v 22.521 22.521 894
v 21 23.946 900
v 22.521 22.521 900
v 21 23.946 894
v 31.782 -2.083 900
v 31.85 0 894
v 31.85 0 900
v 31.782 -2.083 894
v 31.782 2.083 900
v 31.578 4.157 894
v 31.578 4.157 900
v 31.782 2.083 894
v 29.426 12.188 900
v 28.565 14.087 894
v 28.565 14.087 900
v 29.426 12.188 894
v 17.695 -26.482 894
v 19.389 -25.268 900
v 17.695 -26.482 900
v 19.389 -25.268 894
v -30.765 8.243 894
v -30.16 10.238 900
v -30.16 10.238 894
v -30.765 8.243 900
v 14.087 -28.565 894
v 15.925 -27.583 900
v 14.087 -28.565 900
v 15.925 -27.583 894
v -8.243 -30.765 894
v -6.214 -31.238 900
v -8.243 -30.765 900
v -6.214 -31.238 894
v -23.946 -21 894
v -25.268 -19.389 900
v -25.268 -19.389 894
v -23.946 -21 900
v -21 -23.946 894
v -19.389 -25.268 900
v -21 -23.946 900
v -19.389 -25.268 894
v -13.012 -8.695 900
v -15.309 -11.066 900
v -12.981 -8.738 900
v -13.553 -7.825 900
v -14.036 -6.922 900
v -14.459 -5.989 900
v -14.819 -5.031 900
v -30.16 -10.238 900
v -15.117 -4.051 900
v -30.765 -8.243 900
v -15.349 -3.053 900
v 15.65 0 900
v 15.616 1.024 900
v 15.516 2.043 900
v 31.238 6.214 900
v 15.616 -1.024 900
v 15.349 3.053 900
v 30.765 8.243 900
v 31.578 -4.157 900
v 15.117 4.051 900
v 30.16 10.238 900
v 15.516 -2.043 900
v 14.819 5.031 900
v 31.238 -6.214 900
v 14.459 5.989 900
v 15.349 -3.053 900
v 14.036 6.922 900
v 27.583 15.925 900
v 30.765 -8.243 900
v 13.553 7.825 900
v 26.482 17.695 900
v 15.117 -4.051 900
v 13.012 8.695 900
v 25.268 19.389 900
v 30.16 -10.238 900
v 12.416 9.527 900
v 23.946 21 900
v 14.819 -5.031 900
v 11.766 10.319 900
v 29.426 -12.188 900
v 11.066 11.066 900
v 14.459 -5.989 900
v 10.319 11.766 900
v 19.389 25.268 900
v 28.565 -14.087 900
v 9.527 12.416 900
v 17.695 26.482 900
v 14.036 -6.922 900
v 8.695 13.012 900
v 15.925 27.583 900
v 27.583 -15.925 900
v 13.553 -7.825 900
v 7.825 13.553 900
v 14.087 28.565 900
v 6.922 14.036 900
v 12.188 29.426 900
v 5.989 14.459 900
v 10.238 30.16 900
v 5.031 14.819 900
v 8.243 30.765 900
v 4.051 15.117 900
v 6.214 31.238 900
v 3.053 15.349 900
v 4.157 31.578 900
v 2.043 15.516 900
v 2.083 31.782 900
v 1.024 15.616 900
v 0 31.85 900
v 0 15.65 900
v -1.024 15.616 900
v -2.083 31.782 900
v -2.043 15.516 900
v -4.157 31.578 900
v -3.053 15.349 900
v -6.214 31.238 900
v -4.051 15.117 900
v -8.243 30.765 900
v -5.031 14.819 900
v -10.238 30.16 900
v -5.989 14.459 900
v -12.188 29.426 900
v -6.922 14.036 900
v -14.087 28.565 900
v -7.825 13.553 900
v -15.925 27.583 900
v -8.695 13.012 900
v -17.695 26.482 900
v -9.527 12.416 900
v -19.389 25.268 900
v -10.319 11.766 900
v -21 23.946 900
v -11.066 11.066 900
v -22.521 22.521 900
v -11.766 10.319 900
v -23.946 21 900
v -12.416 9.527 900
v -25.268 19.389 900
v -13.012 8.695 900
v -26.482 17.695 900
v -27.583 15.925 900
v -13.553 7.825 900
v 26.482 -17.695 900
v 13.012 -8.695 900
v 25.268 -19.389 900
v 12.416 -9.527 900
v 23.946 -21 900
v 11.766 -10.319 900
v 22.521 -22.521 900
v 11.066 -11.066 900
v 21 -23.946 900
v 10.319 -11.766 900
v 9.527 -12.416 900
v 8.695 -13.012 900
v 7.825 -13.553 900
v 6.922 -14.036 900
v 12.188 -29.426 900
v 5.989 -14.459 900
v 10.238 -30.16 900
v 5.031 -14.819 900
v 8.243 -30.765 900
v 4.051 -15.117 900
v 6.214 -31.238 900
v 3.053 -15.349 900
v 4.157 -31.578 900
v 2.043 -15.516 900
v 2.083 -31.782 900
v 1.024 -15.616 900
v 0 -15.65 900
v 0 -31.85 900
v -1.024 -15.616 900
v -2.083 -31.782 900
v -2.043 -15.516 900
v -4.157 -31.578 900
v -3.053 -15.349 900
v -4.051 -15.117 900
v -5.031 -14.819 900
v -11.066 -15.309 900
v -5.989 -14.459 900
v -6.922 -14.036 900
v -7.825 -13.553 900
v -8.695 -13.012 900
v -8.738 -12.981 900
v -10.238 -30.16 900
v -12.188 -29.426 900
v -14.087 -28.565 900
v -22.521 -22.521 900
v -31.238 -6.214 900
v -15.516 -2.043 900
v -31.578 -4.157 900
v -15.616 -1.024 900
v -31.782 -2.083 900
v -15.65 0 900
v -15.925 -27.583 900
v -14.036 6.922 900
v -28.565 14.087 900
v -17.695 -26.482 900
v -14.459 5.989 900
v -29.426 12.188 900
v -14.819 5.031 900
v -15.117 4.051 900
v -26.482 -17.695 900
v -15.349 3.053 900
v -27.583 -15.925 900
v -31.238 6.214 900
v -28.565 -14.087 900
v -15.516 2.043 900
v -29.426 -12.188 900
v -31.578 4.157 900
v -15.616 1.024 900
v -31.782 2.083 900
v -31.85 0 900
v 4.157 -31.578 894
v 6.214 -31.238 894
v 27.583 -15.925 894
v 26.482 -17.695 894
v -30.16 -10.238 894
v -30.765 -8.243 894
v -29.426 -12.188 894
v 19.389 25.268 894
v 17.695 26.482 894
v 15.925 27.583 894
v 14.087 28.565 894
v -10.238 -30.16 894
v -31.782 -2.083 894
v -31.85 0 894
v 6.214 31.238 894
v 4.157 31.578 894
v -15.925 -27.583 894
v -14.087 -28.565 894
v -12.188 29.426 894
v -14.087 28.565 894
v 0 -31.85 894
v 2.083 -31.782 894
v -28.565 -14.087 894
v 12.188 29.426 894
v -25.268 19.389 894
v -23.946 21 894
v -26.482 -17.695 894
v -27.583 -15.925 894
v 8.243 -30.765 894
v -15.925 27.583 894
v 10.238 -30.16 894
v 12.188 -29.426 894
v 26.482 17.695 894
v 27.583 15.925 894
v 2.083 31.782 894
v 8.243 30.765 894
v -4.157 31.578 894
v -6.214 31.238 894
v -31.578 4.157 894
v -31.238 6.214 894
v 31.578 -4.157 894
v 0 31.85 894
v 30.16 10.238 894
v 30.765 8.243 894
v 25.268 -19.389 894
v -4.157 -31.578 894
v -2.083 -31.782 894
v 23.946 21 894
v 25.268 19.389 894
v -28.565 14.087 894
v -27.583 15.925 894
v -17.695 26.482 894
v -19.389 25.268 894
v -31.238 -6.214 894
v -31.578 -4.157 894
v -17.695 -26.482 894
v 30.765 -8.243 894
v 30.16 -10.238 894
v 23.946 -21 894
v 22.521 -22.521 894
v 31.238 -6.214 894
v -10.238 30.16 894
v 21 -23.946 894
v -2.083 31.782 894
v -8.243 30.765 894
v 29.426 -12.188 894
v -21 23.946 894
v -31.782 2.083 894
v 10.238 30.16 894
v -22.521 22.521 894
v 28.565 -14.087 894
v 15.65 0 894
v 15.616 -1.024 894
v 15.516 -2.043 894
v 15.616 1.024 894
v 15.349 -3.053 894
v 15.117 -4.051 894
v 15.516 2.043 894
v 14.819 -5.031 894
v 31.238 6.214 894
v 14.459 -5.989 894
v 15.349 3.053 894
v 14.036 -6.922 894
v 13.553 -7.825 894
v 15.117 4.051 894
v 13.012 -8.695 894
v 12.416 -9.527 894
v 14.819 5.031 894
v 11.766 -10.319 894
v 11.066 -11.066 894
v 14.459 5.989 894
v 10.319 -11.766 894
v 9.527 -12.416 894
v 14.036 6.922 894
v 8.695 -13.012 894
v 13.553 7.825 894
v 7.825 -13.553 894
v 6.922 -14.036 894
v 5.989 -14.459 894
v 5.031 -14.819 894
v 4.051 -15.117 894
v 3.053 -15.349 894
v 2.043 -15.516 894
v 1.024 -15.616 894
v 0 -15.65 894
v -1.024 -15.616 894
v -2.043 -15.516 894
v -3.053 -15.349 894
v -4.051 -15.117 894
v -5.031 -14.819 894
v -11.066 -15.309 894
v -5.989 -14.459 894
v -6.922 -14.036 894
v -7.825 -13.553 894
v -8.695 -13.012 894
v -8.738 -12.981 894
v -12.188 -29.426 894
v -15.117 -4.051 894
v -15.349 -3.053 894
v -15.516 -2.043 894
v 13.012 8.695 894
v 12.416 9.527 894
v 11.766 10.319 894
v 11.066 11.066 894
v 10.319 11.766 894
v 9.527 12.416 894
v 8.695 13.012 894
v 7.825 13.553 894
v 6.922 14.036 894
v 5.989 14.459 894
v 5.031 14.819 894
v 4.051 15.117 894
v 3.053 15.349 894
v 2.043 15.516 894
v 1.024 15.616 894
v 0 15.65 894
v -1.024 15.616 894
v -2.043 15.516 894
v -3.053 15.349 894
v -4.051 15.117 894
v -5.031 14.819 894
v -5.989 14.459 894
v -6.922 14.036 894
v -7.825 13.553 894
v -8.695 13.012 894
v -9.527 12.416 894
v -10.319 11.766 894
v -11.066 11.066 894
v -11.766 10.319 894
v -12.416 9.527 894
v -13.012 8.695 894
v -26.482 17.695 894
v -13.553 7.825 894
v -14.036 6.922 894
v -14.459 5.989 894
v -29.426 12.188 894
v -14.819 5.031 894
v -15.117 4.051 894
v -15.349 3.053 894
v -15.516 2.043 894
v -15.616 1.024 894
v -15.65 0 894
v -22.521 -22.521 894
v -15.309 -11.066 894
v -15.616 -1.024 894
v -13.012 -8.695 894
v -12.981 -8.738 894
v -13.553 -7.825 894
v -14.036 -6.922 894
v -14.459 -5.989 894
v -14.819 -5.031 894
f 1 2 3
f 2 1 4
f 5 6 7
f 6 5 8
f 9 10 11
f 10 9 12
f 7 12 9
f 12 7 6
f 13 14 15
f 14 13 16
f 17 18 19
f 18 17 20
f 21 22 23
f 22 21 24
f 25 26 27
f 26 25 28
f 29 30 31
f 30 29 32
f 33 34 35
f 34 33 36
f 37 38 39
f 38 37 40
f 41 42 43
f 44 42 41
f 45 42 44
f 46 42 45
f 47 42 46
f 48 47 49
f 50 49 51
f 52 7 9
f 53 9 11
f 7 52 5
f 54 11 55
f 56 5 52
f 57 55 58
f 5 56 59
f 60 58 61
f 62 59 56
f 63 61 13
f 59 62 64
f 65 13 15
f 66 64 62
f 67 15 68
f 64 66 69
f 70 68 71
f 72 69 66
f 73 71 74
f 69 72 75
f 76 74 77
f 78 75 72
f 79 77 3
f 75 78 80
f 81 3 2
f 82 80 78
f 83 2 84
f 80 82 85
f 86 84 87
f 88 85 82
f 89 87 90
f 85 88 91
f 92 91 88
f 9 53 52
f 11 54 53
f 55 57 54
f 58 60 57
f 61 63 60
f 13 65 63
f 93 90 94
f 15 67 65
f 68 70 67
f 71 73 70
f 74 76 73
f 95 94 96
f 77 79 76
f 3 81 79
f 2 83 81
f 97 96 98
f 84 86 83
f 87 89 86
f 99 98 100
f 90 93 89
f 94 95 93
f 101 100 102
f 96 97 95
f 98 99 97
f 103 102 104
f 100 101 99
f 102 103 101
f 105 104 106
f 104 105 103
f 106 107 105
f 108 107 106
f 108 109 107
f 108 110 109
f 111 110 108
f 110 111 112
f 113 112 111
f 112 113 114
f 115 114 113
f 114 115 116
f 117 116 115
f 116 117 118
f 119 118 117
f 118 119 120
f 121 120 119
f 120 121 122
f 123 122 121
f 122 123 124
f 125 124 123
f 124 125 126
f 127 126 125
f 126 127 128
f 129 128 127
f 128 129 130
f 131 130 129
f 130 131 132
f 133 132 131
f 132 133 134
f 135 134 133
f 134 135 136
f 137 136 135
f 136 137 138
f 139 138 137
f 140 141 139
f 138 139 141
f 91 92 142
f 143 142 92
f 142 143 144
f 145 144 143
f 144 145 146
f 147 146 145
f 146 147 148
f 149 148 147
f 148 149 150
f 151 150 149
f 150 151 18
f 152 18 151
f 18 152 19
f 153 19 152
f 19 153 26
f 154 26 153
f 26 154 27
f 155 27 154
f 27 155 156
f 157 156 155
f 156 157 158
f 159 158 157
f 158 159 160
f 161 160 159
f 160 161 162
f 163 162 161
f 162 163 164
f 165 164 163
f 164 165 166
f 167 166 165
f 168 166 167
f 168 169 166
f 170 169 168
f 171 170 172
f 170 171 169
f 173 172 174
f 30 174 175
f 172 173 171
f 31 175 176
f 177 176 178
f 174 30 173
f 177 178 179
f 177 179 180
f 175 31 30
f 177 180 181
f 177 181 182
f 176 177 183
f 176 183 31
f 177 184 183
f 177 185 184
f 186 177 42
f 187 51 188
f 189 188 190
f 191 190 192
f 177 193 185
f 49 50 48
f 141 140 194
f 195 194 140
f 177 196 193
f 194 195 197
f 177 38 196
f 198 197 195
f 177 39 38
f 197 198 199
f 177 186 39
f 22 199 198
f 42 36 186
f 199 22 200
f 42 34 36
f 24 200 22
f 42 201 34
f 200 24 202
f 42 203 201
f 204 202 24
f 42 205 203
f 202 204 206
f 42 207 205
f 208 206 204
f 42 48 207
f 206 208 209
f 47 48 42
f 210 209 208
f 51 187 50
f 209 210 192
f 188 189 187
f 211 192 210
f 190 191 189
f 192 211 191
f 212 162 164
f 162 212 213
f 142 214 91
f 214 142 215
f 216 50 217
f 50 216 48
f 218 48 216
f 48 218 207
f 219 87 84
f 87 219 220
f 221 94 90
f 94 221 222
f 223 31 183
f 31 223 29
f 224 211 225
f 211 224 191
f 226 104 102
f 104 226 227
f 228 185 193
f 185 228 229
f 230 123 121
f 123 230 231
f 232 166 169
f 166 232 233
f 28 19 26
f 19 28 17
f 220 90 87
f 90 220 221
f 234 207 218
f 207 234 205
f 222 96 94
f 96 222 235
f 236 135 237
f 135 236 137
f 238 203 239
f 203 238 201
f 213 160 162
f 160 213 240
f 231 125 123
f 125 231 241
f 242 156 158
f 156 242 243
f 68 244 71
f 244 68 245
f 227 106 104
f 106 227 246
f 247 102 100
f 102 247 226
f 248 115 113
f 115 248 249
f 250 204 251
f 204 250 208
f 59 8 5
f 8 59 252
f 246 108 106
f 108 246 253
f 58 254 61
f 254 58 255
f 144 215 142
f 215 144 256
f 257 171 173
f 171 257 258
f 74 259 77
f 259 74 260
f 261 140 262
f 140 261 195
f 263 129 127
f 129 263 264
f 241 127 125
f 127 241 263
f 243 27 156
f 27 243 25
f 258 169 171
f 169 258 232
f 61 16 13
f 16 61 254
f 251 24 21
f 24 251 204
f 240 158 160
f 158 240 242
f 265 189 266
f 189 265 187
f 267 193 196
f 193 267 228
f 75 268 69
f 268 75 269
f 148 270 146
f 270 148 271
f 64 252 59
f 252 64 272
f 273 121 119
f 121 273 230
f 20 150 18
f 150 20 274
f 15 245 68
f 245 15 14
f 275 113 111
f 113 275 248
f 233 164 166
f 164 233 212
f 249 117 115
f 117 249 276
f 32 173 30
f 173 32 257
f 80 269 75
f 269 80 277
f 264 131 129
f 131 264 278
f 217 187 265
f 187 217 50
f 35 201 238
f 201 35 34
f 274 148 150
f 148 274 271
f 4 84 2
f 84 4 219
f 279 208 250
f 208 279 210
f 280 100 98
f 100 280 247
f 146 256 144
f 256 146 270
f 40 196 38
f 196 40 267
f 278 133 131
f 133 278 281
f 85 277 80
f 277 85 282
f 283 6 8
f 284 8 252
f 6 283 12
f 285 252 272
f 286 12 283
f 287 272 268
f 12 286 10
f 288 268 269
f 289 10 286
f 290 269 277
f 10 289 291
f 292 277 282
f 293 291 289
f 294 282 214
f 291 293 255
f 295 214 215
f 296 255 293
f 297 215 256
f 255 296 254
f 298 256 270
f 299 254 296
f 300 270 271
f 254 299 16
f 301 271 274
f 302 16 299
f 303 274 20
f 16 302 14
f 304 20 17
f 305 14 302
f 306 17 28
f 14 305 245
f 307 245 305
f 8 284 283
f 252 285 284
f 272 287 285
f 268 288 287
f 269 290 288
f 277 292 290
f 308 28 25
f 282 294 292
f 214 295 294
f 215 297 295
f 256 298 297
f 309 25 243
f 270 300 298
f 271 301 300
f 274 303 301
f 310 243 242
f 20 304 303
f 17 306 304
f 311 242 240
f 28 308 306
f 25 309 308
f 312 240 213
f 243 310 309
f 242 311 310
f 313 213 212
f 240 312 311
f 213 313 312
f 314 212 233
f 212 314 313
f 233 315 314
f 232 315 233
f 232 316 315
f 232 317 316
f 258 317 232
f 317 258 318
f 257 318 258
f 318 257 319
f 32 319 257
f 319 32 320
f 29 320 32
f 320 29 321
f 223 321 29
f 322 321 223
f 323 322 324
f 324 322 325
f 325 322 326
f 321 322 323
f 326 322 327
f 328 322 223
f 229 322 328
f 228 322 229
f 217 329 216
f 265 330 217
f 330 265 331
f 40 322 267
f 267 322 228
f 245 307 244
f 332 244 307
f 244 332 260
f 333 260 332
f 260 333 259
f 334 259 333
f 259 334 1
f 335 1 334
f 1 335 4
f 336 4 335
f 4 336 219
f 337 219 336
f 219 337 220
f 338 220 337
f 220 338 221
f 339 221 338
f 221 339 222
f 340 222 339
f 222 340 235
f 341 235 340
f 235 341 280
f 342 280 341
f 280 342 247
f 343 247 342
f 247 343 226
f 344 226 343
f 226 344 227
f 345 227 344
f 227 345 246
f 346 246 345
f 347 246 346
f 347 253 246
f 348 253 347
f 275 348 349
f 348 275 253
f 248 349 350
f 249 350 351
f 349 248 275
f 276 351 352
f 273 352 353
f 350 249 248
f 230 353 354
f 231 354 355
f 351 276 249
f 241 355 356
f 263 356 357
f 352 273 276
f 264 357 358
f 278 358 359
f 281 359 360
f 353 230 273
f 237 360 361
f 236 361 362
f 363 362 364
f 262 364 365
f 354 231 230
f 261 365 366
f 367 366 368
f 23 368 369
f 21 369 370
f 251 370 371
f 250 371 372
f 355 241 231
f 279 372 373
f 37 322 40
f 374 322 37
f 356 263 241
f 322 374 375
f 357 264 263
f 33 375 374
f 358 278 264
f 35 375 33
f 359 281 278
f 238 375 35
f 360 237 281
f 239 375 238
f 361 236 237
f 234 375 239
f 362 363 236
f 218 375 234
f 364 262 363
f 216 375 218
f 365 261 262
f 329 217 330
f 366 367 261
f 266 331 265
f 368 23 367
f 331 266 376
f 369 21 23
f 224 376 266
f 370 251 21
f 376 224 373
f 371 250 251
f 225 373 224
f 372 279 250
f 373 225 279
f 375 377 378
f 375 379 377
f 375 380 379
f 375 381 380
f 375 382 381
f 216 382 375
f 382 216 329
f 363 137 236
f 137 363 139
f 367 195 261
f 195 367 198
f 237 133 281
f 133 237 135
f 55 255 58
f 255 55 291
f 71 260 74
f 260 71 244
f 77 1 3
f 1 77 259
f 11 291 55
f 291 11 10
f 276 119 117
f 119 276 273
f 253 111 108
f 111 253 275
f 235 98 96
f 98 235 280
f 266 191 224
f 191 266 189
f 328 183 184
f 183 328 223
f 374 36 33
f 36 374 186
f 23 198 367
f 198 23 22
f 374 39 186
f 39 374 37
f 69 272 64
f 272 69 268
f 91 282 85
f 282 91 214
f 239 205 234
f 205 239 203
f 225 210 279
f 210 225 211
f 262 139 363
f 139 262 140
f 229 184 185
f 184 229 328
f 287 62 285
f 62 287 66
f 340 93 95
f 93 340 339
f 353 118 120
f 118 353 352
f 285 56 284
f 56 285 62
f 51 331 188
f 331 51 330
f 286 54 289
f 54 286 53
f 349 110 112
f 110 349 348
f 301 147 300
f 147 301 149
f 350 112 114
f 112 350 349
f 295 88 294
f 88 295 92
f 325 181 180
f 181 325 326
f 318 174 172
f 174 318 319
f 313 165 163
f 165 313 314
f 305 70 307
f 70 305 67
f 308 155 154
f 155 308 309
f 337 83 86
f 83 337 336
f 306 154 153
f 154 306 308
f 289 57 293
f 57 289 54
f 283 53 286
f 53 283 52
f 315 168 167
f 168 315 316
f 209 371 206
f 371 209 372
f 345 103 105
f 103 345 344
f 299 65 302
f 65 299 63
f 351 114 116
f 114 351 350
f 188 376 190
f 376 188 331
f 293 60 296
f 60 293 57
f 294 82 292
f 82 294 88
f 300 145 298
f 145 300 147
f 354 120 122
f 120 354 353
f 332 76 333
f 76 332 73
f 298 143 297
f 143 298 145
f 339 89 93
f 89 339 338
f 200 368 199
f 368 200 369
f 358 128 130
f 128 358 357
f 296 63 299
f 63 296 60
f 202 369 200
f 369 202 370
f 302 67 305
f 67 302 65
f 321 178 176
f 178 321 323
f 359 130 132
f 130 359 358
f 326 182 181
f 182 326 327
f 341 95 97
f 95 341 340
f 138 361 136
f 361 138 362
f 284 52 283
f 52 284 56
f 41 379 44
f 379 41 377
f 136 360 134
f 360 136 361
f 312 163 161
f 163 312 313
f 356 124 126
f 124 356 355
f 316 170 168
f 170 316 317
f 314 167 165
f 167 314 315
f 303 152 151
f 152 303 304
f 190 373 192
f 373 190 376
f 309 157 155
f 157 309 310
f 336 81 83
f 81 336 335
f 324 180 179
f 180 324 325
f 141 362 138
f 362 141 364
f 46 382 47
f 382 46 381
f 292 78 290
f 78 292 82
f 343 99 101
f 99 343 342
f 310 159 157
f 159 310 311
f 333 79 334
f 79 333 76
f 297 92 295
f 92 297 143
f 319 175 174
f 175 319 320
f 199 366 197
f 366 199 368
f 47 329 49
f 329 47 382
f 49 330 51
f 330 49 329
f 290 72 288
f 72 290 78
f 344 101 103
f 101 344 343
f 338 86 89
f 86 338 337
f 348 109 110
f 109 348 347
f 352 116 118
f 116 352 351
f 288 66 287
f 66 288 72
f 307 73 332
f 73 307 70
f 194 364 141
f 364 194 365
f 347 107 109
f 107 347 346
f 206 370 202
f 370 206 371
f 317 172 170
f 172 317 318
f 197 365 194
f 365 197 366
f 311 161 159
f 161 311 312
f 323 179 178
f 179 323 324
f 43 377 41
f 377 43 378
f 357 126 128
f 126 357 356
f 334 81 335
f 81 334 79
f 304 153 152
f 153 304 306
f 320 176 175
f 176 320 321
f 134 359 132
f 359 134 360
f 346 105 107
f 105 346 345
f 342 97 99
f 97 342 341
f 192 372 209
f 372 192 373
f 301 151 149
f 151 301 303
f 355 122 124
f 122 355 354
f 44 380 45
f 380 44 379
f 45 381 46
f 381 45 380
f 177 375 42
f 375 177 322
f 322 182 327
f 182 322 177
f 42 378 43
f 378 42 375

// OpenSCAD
// file: ../lib/astra66_core.scad
// =============================================================================
// ASTRA-66 CAD rev B -- core library
// Parameters (generated from analysis.py by build.py), derived stations and helpers.
// Every part file includes this; stations mirror analysis.py X[] exactly.
//
// Frame: rocket axis = +Z, STA 0 = nose tip, stations increase aft.
// Angles: measured about +Z from +X toward +Y.  90 deg = switch / hatch side,
// 270 deg = camera side, 45 deg = rail-button line, fins at 0/90/180/270 deg.
// =============================================================================
include <../astra66_params.scad>

$fn = FN;
EPS = 0.01;
CAD_REV = "B";

// ----------------------------------------------------------------- radii
R_OD    = BODY_OD / 2;                 // body tube outer
R_ID    = BODY_ID / 2;                 // body tube inner
R_SH    = (BODY_ID - FIT_SH) / 2;      // printed shoulder / ring OD radius
R_SI    = R_SH - NC_SH_WALL;           // nose shoulder inner radius
R_CO    = CPL_OD / 2;                  // coupler outer
R_CI    = CPL_ID / 2;                  // coupler inner
R_BH_IN = (CPL_ID - 0.2) / 2;          // inner bulkhead disc (fits in coupler)
R_MO    = MMT_OD / 2;
R_MI    = MMT_ID / 2;
R_RING_BORE = (MMT_OD + FIT_SH) / 2;   // centering-ring / core bore
R_TAB_FLOOR = max(R_MO, RET_CLEAR_D / 2);          // rev B: tab clears the COTS retainer
FIN_TAB_H   = R_OD - R_TAB_FLOOR - FIN_TAB_CLR;

// ----------------------------------------------------------------- stations
X_NC_BASE     = NC_L;
X_SH_END      = NC_L + NC_SH_L;
X_PL_END      = NC_L + PL_L;
X_BAND_END    = X_PL_END + AV_BAND_L;
X_END         = X_BAND_END + BO_L;
L_OVERALL     = X_END;                              // airframe length (excl. COTS retainer)
X_CPL_FWD     = X_PL_END - AV_INS;
X_CPL_AFT     = X_BAND_END + AV_INS;
X_AVB_FWD_OUT = X_CPL_FWD - AV_BH_T;                // AV-303 forward face
X_AVB_AFT_OUT = X_CPL_AFT + GASKET_T;               // AV-304 outer-disc forward face
X_AVB_AFT_END = X_AVB_AFT_OUT + AV_BH_T;            // AV-304 aft face (recovery bay starts)
X_SLED_FWD    = X_CPL_FWD + AV_BH_T + SLED_FWD_GAP;
X_SLED_AFT    = X_SLED_FWD + SLED_L;
X_MMT_AFT     = X_END + MMT_AFT_EXT;
X_MMT_FWD     = X_MMT_AFT - MMT_L;
X_FIN_LE      = X_END - FIN_CR;
X_TAB_FWD     = X_FIN_LE + FIN_TAB_FWD;
X_TAB_AFT     = X_END - LOCK_T;
X_CORE_FWD    = X_TAB_FWD - CORE_RING_T;
X_CORE_AFT    = X_END - LOCK_T;
X_NC_SCREW    = NC_L + NC_SH_L / 2;
X_CAM         = X_SH_END + CAM_OFF;
X_HATCH       = X_SH_END + HATCH_OFF;
X_RB_FWD      = X_MMT_FWD - RB_FWD_OFF;
X_RB_AFT      = X_END - RB_AFT_OFF;
X_TRAY_FWD    = X_AVB_FWD_OUT - TRAY_L;
X_SW          = X_PL_END + AV_BAND_L / 2;
X_MOTOR_FWD   = X_MMT_AFT - MOTOR_L;
X_BAT0        = X_SLED_FWD + 2;
BAT_CAGE_L    = 12 + BAT_L + 0.6;
PAYLOAD_BAY_L  = X_AVB_FWD_OUT - X_SH_END;
RECOVERY_BAY_L = X_MMT_FWD - X_AVB_AFT_END;

FIN_ANGLES      = [for (i = [0 : FIN_N - 1]) i * 360 / FIN_N];
LOCK_SCREW_ANG  = [45, 135, 225, 315];
STATIC_PORT_ANG = [45, 135, 225, 315];

// ----------------------------------------------------------------- geometry helpers
function ogive_rho()  = (R_OD * R_OD + NC_L * NC_L) / (2 * R_OD);
function ogive_r(x)   = sqrt(max(pow(ogive_rho(), 2) - pow(NC_L - x, 2), 0)) + R_OD - ogive_rho();

// Solid of revolution of the tangent ogive between stations x0..x1, radially offset inward by off.
module ogive_solid(x0, x1, off = 0, n = 72) {
    s = (x0 == 0) ? 1 : 0;
    rotate_extrude()
        polygon(concat([[0, x0]],
                       [for (i = [s : n]) let(x = x0 + (x1 - x0) * i / n) [max(ogive_r(x) - off, 0.01), x]],
                       [[0, x1]]));
}

module tube_r(ro, ri, z0, z1) {
    translate([0, 0, z0]) difference() {
        cylinder(r = ro, h = z1 - z0);
        translate([0, 0, -1]) cylinder(r = ri, h = z1 - z0 + 2);
    }
}

module at_angle(a) { rotate([0, 0, a]) children(); }

// Cylinder of diameter d along the radial direction at angle a, from radius r0 to r1, at station z.
module radial_cyl(d, z, a, r0, r1) {
    at_angle(a) translate([r0, 0, z]) rotate([0, 90, 0]) cylinder(d = d, h = r1 - r0);
}

module rounded_rect(l, w, r) { offset(r = r) square([l - 2 * r, w - 2 * r], center = true); }

// Radial prism with a rounded-rectangle footprint (l axial x w tangential) centred at station z.
module radial_prism(a, z, l, w, rr, r0, r1) {
    at_angle(a) translate([r0, 0, z]) rotate([0, 90, 0]) linear_extrude(r1 - r0) rounded_rect(l, w, rr);
}

// Block in the radial frame at angle a: radial r0..r1, tangential +/-hw, stations z0..z1, clipped to radius rc.
module radial_block(a, r0, r1, hw, z0, z1, rc) {
    intersection() {
        at_angle(a) translate([r0, -hw, z0]) cube([r1 - r0, 2 * hw, z1 - z0]);
        translate([0, 0, z0 - 1]) cylinder(r = rc, h = z1 - z0 + 2);
    }
}

// Camera frame: child +Z = lens axis (outward, tilted CAM_TILT aft), origin at the lens face centre.
// Lens-face radius CAM_R0 is the smaller of (a) the tilted barrel rim 0.5 mm inside the bore and
// (b) the tilted camera-body corners 0.5 mm inside the bore -- so any CAM_W/CAM_LEN entered fits.
CAM_SETBACK = CAM_LENS_L * cos(CAM_TILT) + (CAM_LENS_HOLE - 1) / 2 * sin(CAM_TILT) + 0.5;
CAM_R0 = min(R_ID - CAM_SETBACK, sqrt(pow(R_ID - 0.5, 2) - pow(CAM_W / 2, 2)) - CAM_LEN / 2 * sin(CAM_TILT));
module cam_frame() {
    at_angle(CAM_ANG) translate([CAM_R0, 0, X_CAM]) rotate([0, 90 - CAM_TILT, 0]) children();
}

echo(str("ASTRA-66 CAD rev ", CAD_REV, ": L_OVERALL=", L_OVERALL, " payload bay=", PAYLOAD_BAY_L,
         " recovery bay=", RECOVERY_BAY_L, " fin tab depth=", FIN_TAB_H));
// main file
// ASTRA-66 CAD rev B -- BO-404 Forward centering ring (recovery attachment structure I-04b)
// 6 mm birch ply at the MMT forward end; 6 x 3 notch at KEVLAR_NOTCH_ANG for the bonded aramid leader.
// Laser-cut: OUT="2d".
include <../lib/astra66_core.scad>

OUT = "3d";

module BO_404_fwd_centering_ring() {
    difference() {
        tube_r(R_SH, R_RING_BORE, X_MMT_FWD, X_MMT_FWD + CR_T);
        at_angle(KEVLAR_NOTCH_ANG) translate([R_RING_BORE - 0.5, -3, X_MMT_FWD - 1]) cube([3.5, 6, CR_T + 2]);
    }
}

if (OUT == "2d") projection() BO_404_fwd_centering_ring(); else BO_404_fwd_centering_ring();
